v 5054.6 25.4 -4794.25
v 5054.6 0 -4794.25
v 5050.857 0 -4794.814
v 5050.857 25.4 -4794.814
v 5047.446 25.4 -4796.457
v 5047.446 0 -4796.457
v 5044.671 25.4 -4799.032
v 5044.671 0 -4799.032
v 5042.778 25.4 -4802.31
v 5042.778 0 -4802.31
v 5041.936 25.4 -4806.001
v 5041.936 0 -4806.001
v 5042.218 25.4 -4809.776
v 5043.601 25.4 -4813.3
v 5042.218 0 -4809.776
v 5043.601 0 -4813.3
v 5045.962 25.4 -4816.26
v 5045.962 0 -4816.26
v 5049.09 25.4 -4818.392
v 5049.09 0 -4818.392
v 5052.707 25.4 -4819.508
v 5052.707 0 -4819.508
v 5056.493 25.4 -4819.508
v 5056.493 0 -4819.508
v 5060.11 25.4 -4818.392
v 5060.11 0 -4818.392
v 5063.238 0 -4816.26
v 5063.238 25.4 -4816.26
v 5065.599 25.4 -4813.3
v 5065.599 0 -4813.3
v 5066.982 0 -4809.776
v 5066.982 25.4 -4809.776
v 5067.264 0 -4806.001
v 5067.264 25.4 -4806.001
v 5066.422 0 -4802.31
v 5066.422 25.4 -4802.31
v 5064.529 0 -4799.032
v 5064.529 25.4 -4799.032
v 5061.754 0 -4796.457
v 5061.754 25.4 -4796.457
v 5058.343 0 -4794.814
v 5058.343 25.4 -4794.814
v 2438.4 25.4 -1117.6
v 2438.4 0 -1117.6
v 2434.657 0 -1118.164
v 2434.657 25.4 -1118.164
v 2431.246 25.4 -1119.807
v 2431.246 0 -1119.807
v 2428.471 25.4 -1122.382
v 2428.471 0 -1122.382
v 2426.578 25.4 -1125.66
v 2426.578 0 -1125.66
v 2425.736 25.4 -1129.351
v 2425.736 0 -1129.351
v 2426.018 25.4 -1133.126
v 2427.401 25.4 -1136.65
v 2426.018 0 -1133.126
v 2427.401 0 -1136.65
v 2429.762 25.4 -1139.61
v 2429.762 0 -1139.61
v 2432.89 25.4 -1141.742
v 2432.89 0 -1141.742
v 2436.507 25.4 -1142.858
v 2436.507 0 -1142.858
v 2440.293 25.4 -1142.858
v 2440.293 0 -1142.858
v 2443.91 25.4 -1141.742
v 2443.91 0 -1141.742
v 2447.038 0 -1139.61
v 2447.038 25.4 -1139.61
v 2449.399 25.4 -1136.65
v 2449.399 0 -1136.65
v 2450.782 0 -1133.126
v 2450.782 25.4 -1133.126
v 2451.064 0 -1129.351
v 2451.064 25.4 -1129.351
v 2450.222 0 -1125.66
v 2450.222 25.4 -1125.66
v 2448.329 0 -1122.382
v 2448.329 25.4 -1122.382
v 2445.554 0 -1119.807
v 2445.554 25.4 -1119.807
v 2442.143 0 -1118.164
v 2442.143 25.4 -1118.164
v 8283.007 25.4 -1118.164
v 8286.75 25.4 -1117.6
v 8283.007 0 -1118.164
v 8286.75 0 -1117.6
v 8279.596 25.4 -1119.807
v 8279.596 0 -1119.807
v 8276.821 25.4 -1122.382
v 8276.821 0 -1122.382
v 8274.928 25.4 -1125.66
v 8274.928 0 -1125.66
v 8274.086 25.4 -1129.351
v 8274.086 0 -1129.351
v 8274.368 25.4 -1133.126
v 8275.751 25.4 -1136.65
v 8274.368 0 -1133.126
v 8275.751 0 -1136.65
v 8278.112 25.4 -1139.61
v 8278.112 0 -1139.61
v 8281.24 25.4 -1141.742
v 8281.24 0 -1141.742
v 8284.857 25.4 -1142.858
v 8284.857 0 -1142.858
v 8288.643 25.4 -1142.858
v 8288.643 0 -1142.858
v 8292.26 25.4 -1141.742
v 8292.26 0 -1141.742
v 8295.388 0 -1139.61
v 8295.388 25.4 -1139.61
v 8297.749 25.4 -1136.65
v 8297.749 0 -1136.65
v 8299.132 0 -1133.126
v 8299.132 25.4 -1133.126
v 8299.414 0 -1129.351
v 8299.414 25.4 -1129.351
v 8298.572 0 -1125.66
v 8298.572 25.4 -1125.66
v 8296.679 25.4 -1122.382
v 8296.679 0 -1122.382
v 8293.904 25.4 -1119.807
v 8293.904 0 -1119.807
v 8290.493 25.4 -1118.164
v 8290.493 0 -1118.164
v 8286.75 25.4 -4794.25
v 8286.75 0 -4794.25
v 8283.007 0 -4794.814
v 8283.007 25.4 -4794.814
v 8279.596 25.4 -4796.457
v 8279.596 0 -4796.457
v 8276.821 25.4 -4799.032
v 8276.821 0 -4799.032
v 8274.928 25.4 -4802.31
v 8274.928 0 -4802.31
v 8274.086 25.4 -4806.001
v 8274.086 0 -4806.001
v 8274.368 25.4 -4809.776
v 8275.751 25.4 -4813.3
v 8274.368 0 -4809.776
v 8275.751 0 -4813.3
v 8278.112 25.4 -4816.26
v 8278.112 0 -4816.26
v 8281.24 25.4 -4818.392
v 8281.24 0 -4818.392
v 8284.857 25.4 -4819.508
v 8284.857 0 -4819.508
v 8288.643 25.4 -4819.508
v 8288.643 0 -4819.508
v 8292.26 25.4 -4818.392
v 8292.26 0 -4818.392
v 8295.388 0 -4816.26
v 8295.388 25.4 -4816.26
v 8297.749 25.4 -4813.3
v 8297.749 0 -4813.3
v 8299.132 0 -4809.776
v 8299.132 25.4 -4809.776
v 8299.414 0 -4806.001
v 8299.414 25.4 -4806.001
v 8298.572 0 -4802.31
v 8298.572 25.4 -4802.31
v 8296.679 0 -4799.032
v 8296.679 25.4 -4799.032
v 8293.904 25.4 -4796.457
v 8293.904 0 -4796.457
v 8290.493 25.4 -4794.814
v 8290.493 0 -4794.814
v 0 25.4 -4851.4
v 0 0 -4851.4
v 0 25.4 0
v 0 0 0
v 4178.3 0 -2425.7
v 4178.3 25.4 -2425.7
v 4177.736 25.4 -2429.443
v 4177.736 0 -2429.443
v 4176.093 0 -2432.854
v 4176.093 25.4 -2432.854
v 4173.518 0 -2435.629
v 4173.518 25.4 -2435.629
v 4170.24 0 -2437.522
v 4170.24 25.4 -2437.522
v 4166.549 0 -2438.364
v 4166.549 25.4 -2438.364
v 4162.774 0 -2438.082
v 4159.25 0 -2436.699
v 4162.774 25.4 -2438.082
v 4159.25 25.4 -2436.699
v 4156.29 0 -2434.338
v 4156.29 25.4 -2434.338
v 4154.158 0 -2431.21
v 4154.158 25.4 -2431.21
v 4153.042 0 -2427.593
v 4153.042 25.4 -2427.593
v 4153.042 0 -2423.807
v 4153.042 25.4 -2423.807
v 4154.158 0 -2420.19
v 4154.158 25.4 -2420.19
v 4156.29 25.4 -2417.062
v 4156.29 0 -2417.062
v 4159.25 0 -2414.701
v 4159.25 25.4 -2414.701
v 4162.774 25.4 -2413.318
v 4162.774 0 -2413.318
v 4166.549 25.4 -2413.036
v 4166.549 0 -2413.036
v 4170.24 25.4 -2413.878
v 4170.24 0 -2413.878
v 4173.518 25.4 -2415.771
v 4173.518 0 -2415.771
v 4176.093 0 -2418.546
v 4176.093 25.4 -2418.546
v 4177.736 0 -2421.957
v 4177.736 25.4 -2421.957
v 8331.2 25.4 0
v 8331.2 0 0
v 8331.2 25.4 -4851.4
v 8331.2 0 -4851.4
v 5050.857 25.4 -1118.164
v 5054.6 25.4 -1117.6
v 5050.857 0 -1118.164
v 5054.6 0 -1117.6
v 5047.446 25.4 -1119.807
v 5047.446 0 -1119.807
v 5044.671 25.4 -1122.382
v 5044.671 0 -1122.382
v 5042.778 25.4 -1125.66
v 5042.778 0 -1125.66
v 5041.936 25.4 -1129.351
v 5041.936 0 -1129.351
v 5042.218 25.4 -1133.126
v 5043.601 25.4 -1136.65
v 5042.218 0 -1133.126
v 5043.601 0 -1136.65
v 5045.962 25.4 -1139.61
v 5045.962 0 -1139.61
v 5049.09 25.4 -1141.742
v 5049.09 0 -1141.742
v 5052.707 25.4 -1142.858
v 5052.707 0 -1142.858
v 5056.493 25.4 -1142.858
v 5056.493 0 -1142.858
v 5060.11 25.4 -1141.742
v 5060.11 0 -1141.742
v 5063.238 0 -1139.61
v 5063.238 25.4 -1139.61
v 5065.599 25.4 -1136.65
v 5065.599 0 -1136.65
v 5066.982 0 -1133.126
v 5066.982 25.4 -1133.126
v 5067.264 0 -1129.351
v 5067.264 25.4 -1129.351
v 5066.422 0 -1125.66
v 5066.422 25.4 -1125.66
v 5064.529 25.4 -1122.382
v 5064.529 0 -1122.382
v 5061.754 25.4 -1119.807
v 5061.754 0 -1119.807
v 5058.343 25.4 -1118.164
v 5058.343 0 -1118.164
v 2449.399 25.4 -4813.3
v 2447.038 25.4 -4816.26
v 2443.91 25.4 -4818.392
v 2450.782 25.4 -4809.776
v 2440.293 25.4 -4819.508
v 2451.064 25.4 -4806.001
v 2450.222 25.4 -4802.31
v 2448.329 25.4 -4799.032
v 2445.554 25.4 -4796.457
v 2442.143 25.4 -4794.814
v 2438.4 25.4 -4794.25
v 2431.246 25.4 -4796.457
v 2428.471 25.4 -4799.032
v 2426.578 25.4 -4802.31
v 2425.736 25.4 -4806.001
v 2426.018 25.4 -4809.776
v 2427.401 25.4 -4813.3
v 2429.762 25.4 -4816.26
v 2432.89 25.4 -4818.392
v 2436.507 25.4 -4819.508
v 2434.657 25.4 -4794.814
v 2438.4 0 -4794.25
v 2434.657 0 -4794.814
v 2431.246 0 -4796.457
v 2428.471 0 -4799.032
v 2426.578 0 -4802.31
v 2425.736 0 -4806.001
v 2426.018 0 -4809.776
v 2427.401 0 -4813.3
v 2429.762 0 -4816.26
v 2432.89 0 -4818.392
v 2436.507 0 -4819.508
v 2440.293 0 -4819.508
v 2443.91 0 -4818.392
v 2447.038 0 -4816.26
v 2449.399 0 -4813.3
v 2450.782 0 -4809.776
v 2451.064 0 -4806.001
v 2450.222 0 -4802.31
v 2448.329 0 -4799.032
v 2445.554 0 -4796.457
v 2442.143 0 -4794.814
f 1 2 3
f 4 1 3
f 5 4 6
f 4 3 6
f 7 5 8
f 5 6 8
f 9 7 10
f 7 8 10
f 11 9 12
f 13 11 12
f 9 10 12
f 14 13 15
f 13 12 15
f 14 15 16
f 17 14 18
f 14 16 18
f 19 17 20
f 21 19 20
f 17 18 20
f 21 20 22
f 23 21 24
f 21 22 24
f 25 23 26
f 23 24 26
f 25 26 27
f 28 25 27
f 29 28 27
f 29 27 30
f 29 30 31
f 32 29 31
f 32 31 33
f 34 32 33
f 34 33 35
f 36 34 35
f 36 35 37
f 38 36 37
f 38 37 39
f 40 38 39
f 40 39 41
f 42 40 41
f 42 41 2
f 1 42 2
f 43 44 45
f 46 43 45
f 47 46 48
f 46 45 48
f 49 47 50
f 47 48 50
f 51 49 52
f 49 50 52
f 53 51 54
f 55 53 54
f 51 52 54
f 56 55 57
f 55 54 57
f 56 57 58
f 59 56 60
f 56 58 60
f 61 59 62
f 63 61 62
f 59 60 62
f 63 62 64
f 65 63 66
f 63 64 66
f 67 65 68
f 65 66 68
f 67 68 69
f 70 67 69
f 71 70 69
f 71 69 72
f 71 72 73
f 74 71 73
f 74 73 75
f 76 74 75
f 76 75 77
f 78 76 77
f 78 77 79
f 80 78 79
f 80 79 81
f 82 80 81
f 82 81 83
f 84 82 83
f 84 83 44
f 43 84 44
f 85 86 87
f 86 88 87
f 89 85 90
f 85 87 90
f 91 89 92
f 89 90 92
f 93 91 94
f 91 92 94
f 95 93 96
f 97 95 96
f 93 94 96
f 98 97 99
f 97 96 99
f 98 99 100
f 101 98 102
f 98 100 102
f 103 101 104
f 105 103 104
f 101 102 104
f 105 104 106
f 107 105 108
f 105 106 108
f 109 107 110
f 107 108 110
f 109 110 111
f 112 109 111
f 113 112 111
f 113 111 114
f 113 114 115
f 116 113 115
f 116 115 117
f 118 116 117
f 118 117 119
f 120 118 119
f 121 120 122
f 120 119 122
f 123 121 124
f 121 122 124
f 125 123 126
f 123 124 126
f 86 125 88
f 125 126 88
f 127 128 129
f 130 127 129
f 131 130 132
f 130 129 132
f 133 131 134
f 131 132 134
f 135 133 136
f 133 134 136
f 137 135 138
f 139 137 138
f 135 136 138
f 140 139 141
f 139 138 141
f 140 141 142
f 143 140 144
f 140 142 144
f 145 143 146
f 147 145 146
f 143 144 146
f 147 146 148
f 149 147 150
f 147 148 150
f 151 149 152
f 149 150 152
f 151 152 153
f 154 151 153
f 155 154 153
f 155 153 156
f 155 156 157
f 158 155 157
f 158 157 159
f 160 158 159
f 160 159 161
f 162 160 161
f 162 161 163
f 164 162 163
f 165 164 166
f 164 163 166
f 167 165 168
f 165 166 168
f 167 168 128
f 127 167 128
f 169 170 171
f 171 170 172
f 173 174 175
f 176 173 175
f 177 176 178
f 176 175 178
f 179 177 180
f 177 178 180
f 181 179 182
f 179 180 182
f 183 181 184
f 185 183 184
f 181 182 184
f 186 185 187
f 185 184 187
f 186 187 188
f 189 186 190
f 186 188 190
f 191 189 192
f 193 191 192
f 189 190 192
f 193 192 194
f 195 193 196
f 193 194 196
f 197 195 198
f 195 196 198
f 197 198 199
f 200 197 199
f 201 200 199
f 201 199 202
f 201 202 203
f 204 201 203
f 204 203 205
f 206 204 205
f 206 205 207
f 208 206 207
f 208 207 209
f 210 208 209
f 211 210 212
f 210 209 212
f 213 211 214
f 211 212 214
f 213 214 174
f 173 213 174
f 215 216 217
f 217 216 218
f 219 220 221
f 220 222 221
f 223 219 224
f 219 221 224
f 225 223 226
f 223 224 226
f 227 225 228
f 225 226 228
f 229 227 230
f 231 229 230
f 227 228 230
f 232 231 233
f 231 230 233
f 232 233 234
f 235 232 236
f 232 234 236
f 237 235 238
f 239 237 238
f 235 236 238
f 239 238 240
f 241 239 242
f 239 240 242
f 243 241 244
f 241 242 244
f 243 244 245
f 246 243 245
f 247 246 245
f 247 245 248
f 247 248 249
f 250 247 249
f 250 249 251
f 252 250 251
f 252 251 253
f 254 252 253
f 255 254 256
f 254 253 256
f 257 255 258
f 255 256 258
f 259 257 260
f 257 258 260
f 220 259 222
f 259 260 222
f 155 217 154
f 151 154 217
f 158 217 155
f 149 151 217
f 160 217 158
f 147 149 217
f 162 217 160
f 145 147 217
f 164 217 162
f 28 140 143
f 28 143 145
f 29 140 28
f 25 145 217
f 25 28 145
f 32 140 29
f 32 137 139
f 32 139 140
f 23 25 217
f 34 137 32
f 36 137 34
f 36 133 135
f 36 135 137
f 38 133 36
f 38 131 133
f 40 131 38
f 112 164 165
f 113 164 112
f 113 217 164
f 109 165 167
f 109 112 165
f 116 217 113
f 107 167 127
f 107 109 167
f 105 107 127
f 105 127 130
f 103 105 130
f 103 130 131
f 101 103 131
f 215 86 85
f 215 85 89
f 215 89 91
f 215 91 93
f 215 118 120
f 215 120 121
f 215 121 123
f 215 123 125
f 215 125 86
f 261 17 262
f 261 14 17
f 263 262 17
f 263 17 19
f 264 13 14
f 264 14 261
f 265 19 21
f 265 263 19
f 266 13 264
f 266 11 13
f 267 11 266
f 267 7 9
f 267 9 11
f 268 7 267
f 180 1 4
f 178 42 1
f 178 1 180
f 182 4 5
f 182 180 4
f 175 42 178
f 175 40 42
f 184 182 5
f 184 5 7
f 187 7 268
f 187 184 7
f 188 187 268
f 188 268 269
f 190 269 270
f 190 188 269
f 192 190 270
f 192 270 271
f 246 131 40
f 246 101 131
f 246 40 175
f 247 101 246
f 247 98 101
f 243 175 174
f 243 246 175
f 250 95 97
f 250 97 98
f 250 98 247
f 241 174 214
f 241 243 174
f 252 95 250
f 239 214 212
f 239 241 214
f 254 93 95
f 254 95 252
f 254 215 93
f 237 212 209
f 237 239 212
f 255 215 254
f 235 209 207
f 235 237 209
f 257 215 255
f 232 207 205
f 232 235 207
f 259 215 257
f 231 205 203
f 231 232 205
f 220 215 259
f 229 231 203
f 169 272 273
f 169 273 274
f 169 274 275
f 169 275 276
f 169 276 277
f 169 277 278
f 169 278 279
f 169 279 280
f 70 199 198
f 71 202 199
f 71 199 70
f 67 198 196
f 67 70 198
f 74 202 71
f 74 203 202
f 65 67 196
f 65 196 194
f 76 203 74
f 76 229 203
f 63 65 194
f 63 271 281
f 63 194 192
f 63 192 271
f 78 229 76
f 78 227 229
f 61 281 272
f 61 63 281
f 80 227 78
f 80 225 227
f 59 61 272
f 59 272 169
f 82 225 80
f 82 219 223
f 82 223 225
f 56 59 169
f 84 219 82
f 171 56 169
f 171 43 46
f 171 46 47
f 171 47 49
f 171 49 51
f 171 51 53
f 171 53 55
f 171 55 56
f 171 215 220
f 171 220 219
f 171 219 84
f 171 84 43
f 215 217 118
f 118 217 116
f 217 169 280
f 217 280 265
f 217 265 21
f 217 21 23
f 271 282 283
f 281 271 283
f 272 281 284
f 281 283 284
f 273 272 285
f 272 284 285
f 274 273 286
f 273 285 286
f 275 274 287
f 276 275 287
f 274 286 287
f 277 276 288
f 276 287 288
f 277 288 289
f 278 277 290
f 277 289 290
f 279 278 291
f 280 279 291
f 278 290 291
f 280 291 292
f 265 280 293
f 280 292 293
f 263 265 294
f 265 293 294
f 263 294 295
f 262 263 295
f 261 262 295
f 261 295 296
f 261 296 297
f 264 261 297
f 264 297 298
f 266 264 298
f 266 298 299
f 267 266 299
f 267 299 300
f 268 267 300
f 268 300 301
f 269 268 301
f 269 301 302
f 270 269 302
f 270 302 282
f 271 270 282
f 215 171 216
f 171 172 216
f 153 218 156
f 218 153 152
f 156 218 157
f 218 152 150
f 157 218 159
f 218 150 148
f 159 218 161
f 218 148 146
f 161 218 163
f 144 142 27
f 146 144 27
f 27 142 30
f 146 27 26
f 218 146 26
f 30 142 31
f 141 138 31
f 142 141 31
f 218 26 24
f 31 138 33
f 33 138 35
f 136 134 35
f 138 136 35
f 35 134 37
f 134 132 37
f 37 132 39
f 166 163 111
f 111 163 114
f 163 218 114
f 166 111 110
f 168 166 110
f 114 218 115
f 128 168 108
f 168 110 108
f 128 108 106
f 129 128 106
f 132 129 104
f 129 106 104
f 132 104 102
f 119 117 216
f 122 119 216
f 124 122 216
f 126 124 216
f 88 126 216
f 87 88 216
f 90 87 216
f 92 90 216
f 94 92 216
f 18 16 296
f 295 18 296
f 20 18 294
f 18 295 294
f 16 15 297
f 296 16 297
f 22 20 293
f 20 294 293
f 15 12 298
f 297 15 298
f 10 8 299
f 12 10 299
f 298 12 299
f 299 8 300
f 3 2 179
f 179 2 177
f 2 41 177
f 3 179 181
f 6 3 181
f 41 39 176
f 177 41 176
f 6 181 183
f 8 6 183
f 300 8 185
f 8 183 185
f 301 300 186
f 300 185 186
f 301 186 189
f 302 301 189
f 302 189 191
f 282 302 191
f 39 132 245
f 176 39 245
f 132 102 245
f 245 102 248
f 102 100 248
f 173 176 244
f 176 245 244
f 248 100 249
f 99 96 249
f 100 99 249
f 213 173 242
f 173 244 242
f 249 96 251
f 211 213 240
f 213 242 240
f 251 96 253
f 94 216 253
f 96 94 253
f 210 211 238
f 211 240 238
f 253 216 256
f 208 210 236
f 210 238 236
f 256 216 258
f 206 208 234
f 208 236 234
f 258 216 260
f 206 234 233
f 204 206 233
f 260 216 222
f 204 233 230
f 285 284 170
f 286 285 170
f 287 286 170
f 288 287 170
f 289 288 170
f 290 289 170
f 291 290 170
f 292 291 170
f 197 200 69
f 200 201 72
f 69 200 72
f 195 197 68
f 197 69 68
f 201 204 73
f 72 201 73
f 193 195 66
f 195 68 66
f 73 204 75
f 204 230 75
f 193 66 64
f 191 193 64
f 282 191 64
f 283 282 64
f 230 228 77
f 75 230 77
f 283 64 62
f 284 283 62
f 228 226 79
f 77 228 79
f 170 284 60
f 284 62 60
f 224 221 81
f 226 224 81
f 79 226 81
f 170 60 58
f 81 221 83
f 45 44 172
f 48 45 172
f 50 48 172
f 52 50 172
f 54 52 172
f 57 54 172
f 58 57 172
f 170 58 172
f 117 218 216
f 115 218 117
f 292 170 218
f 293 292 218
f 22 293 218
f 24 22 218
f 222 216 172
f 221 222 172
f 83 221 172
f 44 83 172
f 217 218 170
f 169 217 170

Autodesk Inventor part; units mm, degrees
ref_plane "YZ Plane" through (0, 0, 0) normal (1, 0, 0) x (0, 1, 0)
ref_plane "XZ Plane" through (0, 0, 0) normal (0, 1, 0) x (-1, 0, 0)
ref_plane "XY Plane" through (0, 0, 0) normal (0, 0, 1) x (1, 0, 0)
sketch "Sketch1" plane through (0, 0, 0) normal (0, 1, 0) x (-1, 0, 0)
  line L0 (0, 0) -> (-8331.2, 0)
  line L1 (-8331.2, 0) -> (-8331.2, -4851.4)
  line L2 (-8331.2, -4851.4) -> (0, -4851.4)
  line L3 (0, -4851.4) -> (0, 0)
  dimension "d0" = 8331.2
  dimension "d1" = 4851.4
extrude "Extrusion1" add sketch "Sketch1" along normal blind 25.4
sketch "Sketch2" plane through (0, 25.4, 0) normal (0, 1, 0) x (1, 0, 0)
  line L0 (8331.2, 0) -> (8331.2, 4851.4) projected
  line L1 (8331.2, 4851.4) -> (0, 4851.4) projected
  circle A0 centre (8286.75, 4806.95) radius 12.7
  circle A1 centre (5054.6, 4806.95) radius 12.7
  circle A2 centre (2438.4, 4806.95) radius 12.7
  circle A3 centre (-184.15, 4806.95) radius 12.7
  circle A4 centre (8286.75, 1130.3) radius 12.7
  circle A5 centre (5054.6, 1130.3) radius 12.7
  circle A6 centre (2438.4, 1130.3) radius 12.7
  circle A7 centre (-184.15, 1130.3) radius 12.7
  dimension "d4" = 25.4
  dimension "d5" = 44.45
  dimension "d6" = 44.45
  dimension "d7" = 25.4
  dimension "d8" = 3232.15
  dimension "d9" = 25.4
  dimension "d10" = 2616.2
  dimension "d11" = 25.4
  dimension "d12" = 2622.55
  dimension "d15" = 3676.65
hole "Hole1" at (8286.75, 25.4, -1130.3) at (8286.75, 25.4, -4806.95) at (5054.6, 25.4, -1130.3) at (5054.6, 25.4, -4806.95) at (2438.4, 25.4, -4806.95) at (2438.4, 25.4, -1130.3) direction (0, -1, 0) diameter 25.4 depth 25.4 tip angle 118
sketch "Sketch3" plane through (0, 25.4, 0) normal (0, 1, 0) x (1, 0, 0)
  circle A0 centre (4165.6, 2425.7) radius 12.7
  dimension "d27" = 25.4
extrude "Extrusion2" cut sketch "Sketch3" against normal blind 1092.2
properties part number "porch" material "Concrete"
